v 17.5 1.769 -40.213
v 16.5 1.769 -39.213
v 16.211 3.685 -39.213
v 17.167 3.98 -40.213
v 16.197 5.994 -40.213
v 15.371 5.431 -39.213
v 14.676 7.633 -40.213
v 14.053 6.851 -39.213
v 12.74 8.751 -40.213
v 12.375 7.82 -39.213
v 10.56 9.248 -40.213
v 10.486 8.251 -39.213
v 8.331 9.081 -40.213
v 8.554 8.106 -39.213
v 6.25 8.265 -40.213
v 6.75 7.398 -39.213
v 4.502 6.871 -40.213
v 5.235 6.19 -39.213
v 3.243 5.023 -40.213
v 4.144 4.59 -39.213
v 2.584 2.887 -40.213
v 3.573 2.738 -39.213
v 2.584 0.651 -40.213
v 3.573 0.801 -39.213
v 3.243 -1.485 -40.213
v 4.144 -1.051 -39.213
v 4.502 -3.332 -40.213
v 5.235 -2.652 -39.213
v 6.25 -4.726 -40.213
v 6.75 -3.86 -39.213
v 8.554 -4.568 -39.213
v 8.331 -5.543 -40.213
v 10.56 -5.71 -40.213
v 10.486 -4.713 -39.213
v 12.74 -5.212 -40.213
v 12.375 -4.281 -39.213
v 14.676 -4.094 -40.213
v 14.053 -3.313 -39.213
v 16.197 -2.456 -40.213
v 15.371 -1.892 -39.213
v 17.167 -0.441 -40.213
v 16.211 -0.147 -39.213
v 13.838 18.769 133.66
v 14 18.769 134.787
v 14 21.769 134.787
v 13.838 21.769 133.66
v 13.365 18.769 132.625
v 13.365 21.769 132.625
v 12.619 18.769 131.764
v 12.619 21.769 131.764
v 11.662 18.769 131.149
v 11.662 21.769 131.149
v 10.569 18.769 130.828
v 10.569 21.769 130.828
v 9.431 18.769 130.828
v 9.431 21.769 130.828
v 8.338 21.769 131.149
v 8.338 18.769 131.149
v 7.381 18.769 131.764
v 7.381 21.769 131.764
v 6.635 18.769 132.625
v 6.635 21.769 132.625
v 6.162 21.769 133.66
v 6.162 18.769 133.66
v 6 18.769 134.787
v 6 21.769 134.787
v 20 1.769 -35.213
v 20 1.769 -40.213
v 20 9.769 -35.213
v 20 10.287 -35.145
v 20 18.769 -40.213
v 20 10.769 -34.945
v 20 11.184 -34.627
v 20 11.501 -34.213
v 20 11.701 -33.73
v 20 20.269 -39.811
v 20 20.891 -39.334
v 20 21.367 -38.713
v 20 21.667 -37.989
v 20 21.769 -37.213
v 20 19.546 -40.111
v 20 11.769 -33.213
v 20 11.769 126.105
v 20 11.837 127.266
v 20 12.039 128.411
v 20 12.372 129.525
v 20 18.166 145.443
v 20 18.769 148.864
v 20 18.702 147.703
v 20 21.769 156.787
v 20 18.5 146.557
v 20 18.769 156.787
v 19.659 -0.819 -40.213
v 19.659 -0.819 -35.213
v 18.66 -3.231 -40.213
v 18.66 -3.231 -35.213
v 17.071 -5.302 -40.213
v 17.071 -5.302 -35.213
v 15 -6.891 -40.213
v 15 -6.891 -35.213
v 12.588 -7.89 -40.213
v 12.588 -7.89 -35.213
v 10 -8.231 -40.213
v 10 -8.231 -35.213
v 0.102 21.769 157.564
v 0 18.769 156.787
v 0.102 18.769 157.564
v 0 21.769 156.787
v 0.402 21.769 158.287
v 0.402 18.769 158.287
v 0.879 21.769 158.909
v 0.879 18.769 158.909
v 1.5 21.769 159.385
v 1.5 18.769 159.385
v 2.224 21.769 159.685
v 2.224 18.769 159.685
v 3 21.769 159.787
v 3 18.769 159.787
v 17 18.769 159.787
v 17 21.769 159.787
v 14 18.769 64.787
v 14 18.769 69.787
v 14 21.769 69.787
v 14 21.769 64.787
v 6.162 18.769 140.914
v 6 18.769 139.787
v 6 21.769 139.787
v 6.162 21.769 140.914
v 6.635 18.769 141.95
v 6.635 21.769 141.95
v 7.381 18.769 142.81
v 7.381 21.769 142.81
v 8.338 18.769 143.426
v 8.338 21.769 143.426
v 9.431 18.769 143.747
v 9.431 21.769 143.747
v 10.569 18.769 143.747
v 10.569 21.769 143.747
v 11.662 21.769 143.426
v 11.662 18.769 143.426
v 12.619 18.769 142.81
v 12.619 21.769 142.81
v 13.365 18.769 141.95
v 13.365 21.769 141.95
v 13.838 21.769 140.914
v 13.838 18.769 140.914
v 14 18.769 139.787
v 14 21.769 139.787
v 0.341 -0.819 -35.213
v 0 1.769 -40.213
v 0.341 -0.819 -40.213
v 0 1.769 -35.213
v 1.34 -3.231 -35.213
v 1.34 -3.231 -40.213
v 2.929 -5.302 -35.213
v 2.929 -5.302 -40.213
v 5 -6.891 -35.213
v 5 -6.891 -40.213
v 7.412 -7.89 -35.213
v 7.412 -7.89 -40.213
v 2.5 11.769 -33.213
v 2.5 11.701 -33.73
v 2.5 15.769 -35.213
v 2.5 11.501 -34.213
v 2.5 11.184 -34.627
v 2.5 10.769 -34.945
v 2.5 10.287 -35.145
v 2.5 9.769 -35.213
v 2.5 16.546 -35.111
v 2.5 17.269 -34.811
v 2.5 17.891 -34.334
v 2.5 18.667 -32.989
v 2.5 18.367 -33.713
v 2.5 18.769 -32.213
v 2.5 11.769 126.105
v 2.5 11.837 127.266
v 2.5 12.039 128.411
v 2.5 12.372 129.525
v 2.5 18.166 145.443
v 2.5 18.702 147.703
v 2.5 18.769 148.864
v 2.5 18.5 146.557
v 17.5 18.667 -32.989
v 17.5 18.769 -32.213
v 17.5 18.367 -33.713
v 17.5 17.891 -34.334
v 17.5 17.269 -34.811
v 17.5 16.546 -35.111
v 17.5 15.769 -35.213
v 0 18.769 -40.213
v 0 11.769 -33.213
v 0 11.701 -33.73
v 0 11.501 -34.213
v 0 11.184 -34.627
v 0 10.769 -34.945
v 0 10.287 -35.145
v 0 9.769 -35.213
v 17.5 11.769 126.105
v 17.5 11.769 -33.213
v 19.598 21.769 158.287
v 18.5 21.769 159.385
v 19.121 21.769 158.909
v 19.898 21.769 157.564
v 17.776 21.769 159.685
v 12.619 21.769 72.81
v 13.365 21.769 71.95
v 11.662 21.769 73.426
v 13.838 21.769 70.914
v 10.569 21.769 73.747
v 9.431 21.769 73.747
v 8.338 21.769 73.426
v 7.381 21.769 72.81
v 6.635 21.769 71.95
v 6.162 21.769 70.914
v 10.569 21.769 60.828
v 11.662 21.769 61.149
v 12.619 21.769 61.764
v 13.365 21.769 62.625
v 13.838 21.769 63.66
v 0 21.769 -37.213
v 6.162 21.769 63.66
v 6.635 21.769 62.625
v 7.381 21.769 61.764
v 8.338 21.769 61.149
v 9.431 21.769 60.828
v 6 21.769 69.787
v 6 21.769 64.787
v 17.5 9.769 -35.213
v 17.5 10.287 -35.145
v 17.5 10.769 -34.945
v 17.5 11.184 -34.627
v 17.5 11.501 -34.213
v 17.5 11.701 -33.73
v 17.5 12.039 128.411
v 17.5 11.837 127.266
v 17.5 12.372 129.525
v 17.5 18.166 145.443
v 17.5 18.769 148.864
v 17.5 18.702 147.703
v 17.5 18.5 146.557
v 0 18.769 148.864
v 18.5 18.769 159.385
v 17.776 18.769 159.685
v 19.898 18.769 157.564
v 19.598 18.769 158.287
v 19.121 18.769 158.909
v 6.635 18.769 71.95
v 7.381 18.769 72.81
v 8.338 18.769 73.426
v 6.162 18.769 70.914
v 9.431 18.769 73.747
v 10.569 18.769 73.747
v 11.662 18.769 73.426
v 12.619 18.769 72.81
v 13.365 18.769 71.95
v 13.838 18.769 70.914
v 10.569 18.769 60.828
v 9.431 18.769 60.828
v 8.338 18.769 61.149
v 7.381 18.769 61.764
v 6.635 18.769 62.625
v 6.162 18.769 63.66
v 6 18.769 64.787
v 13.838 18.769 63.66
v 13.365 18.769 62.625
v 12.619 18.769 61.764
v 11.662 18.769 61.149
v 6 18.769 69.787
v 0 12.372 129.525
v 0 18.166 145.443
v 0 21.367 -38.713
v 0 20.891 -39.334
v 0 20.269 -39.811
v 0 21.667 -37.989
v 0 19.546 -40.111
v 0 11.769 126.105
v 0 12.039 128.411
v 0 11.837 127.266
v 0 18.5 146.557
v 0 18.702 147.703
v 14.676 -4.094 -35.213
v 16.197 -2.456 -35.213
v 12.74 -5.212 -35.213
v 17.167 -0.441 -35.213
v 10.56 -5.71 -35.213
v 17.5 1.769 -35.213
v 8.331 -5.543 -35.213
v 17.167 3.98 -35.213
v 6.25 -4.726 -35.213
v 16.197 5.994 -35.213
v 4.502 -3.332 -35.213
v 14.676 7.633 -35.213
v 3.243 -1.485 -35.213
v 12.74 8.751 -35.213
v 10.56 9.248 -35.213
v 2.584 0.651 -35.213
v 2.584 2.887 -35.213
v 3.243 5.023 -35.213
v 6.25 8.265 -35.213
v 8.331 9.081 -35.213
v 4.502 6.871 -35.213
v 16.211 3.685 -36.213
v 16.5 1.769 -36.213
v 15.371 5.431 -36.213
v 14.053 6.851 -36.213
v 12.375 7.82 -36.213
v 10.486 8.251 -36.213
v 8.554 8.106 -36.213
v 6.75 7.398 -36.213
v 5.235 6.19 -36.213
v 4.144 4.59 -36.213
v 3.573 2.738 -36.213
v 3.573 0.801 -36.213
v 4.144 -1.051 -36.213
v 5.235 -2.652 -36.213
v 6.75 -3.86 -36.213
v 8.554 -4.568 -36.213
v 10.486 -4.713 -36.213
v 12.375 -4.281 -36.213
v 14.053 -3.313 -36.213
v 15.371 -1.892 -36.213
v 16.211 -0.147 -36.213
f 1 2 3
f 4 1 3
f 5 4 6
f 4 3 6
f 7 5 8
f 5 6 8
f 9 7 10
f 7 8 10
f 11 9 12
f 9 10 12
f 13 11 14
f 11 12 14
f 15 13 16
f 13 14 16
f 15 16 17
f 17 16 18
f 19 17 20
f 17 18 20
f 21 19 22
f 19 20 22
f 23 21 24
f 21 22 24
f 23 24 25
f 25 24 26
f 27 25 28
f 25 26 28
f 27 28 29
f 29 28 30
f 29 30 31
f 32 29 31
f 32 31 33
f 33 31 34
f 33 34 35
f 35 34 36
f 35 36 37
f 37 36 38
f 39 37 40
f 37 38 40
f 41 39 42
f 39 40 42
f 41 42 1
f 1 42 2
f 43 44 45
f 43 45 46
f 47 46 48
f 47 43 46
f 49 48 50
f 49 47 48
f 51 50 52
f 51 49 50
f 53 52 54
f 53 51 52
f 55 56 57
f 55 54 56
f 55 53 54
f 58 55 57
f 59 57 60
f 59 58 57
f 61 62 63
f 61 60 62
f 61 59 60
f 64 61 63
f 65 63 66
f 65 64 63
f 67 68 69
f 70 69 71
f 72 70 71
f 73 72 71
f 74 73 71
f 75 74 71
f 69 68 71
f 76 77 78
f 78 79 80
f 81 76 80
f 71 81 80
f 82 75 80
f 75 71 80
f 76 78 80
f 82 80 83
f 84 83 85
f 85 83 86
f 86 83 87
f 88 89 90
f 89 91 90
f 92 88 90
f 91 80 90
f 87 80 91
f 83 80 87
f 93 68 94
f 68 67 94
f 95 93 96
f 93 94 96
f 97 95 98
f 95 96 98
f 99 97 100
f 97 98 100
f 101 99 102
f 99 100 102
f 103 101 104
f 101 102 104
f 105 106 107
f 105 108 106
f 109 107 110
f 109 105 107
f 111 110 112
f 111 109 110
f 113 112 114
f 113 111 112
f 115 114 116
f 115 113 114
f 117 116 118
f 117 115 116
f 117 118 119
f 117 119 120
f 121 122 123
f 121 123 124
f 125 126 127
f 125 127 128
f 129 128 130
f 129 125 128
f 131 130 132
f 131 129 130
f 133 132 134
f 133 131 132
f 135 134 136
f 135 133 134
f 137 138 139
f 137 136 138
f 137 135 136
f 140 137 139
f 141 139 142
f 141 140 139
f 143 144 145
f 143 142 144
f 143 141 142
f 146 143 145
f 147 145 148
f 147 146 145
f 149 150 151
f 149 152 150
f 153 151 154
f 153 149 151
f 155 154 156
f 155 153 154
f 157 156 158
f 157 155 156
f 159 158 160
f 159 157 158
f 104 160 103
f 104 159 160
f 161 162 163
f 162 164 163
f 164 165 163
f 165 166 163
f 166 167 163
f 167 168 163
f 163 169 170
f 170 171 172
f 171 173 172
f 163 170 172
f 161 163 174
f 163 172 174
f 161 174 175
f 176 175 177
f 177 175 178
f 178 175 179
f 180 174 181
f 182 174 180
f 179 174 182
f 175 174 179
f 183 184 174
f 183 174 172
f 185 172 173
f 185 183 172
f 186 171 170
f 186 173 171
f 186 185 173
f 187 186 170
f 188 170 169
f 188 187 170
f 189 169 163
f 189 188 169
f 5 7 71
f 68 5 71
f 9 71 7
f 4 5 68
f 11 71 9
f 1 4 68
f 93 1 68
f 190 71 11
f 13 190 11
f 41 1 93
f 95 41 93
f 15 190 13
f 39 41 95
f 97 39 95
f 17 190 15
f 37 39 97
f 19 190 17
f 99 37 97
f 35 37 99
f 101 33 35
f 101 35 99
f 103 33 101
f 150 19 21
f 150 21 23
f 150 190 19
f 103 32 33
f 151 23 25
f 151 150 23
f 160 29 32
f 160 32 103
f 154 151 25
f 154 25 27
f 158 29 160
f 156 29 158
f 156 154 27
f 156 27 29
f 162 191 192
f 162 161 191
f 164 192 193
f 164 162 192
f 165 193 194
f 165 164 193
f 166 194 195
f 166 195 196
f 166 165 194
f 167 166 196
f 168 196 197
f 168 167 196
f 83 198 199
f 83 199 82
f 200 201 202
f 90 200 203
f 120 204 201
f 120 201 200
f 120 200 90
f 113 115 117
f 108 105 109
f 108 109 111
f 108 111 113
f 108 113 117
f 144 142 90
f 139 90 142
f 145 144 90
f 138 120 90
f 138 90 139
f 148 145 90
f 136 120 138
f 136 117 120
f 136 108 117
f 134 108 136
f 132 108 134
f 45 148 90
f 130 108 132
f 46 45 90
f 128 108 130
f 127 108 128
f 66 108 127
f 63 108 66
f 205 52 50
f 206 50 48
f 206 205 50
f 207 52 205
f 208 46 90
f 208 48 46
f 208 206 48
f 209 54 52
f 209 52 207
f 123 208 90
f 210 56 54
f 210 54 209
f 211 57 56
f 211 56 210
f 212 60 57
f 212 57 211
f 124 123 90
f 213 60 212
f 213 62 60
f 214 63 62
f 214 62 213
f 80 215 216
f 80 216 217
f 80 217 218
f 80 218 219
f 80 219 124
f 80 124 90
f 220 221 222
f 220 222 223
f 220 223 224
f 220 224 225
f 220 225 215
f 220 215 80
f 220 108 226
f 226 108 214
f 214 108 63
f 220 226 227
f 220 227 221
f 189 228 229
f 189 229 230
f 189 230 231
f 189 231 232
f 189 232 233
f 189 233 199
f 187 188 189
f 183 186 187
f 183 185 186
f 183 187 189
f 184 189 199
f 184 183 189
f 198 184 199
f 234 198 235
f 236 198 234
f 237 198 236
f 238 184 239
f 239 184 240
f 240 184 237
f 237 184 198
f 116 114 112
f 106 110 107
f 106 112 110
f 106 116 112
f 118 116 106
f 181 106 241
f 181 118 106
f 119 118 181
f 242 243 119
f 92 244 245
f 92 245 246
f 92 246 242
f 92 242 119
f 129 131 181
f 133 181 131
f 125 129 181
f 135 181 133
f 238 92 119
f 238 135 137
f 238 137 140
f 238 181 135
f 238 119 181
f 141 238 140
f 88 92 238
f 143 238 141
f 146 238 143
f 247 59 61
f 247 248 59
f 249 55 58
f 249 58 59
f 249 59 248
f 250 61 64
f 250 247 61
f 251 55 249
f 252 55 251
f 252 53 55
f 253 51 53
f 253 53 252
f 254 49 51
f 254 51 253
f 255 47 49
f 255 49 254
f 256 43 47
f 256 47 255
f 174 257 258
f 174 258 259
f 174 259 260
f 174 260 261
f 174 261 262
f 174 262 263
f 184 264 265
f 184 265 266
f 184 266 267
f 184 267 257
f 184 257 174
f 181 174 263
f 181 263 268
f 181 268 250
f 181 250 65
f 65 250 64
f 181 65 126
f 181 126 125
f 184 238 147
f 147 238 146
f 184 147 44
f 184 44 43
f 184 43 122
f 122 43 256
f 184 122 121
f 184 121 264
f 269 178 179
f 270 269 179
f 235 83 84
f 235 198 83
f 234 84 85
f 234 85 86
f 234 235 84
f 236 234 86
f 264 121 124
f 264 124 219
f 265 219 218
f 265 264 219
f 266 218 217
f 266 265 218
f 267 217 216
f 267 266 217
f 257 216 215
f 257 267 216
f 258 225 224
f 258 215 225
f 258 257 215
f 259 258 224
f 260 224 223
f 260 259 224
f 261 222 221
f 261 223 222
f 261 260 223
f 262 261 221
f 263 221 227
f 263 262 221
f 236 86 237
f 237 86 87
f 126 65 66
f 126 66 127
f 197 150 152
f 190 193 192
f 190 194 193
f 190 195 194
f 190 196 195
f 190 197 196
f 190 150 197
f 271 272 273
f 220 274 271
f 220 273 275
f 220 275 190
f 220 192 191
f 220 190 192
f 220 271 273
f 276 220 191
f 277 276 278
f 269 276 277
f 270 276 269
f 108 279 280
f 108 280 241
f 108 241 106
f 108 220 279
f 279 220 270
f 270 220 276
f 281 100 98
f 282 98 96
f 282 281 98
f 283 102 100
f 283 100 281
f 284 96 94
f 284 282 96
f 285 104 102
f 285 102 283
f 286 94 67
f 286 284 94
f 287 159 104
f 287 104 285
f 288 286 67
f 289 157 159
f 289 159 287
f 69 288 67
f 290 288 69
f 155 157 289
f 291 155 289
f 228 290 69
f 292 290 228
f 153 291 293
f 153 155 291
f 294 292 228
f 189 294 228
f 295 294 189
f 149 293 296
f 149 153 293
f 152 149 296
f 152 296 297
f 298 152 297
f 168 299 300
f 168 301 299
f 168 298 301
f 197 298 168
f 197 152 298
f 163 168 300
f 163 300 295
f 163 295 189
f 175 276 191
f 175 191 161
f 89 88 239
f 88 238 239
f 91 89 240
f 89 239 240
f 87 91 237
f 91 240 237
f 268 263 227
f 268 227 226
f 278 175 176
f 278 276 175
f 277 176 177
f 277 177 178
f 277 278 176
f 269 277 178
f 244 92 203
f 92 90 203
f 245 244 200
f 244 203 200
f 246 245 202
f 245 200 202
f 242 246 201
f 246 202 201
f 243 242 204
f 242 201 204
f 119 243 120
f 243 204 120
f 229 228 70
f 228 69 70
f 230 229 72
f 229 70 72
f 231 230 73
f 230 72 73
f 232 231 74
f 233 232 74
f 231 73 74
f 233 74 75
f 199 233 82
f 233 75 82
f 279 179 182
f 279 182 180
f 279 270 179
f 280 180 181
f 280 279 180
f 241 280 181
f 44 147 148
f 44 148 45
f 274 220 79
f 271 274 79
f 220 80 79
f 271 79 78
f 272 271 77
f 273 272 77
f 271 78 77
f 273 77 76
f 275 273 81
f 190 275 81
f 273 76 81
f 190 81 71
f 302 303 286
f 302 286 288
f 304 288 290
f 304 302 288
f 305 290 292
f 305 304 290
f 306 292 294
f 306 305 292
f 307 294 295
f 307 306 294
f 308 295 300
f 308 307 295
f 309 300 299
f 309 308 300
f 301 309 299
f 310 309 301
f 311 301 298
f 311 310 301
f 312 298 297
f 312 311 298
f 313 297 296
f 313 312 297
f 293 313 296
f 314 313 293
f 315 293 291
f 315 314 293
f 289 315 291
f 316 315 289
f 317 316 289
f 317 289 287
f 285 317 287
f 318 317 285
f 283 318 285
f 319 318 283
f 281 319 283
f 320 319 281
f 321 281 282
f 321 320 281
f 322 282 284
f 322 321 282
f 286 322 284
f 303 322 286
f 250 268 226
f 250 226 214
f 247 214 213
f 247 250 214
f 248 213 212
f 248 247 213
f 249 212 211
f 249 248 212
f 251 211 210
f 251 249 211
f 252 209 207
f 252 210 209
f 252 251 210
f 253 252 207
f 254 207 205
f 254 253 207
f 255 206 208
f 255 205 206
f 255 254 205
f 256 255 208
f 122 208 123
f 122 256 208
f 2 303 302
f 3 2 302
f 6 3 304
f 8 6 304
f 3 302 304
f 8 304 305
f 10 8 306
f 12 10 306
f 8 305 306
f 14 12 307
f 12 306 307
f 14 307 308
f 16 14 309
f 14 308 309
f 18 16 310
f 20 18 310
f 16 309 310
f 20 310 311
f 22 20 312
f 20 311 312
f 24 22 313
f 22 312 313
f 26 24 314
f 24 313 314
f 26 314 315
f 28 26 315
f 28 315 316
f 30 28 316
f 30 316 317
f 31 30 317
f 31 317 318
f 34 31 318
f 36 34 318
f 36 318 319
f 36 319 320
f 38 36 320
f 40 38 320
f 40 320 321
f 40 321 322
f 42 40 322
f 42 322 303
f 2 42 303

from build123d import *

# Parameters (mm, degrees)
BOSS_EXTRUDE1_DEPTH = 20
CUT_EXTRUDE1_DEPTH  = 20
LPATTERN1_COUNT     = 2
LPATTERN1_PITCH     = 70
SKETCH3_R           = 6.5
CUT_EXTRUDE2_DEPTH  = 20
FILLET1_R           = 3
FILLET2_R           = 10
CHAMFER1_SIZE       = 1
FILLET3_R           = 3
SKETCH4_W           = 2.5
SKETCH4_H           = 193.282741961
BOSS_EXTRUDE2_DEPTH = 7
LPATTERN2_COUNT     = 2
LPATTERN2_PITCH     = 17.5
CHAMFER2_SIZE       = 27.474774195
CHAMFER2_SIZE_2     = 10
FILLET4_R           = 10
FILLET5_R           = 2


# Some blends are built 0.0001 mm under size
with BuildPart() as part:
    # Sketch1 → Boss-Extrude1 (new body)
    with BuildSketch(Plane(origin=(0, 0, 0), x_dir=(0, 0, -1), z_dir=(1, 0, 0))):
        Polygon((-159.787234043, 21.769316909), (40.212765957, 21.769316909), (40.212765957, -8.230683091), (35.212765957, -8.230683091), (35.212765957, 18.769316909), (-159.787234043, 18.769316909), align=None)
    extrude(amount=BOSS_EXTRUDE1_DEPTH)

    # Sketch2 → Cut-Extrude1 (cut)
    with BuildSketch(Plane.XZ.offset(-18.769316909)):
        with BuildLine():
            Line((14, 139.787234043), (14, 134.787234043))
            ThreePointArc((14, 134.787234043), (10, 130.787234043), (6, 134.787234043))
            Line((6, 134.787234043), (6, 139.787234043))
            ThreePointArc((6, 139.787234043), (10, 143.787234043), (14, 139.787234043))
        make_face()
    cut_extrude1 = extrude(amount=-CUT_EXTRUDE1_DEPTH, mode=Mode.SUBTRACT)

    # LPattern1: Cut-Extrude1 ×2
    with Locations(*[(0, 0, -i * LPATTERN1_PITCH) for i in range(1, LPATTERN1_COUNT)]):
        add(cut_extrude1, mode=Mode.SUBTRACT)

    # Sketch3 → Cut-Extrude2 (cut)
    with BuildSketch(Plane.XY.offset(-35.212765957)):
        with Locations((10, 1.769316909)):
            Circle(SKETCH3_R)
    extrude(amount=-CUT_EXTRUDE2_DEPTH, mode=Mode.SUBTRACT)

    # Fillet1
    fillet1_edges = [part.edges().sort_by_distance(p)[0] for p in [
        (10, 21.769316909, -40.212765957),
        (10, 18.769316909, -35.212765957),
    ]]
    fillet(fillet1_edges, radius=FILLET1_R)

    # Fillet2
    fillet2_edges = [part.edges().sort_by_distance(p)[0] for p in [
        (0, -8.230683091, -37.712765957),
        (20, -8.230683091, -37.712765957),
    ]]
    fillet(fillet2_edges, radius=FILLET2_R - 0.0001)  # a hair under: the kernel refuses the full size

    # Chamfer1
    chamfer1_edges = [part.edges().sort_by_distance(p)[0] for p in [
        (3.5, 1.769316909, -40.212765957),
        (3.5, 1.769316909, -35.212765957),
    ]]
    chamfer(chamfer1_edges, length=CHAMFER1_SIZE)

    # Fillet3
    fillet3_edges = [part.edges().sort_by_distance(p)[0] for p in [
        (20, 20.269316909, 159.787234043),
        (0, 20.269316909, 159.787234043),
    ]]
    fillet(fillet3_edges, radius=FILLET3_R)

    # Sketch4 → Boss-Extrude2 (add)
    with BuildSketch(Plane.XZ.offset(-18.769316909)):
        with Locations((1.25, 58.701442972)):
            Rectangle(SKETCH4_W, SKETCH4_H)
    boss_extrude2 = extrude(amount=BOSS_EXTRUDE2_DEPTH)

    # LPattern2: Boss-Extrude2 ×2
    with Locations(*[(i * LPATTERN2_PITCH, 0, 0) for i in range(1, LPATTERN2_COUNT)]):
        add(boss_extrude2)

    # Chamfer2
    # the kernel refuses this chamfer: 27.474774195, 10 mm, written as the material it takes off along each edge
    with BuildSketch(Plane(origin=(73.774914494, 11.769316909, 155.342813952), x_dir=(0, -0.013184058198645638, -0.9999130865277315), z_dir=(-1, 0, 0))) as chamfer2_piece_1_section:
        Polygon((CHAMFER2_SIZE * 0.999913086511, -CHAMFER2_SIZE * 0.0131840581984), (-CHAMFER2_SIZE_2 * 0.0131840581986, -CHAMFER2_SIZE_2 * 0.999913086528), (0, 0), align=None)
    chamfer2_piece_1 = extrude(amount=145.049828987, mode=Mode.PRIVATE)
    chamfer2_piece_1 = split(chamfer2_piece_1, bisect_by=Plane(origin=(1.25, 18.769316909, 145.126312786), z_dir=(0, -1, 0)), keep=Keep.TOP, mode=Mode.PRIVATE)
    add(chamfer2_piece_1, mode=Mode.SUBTRACT)
    with BuildSketch(Plane(origin=(91.274914494, 11.769316909, 155.342813952), x_dir=(0, -0.013184058198645638, -0.9999130865277315), z_dir=(-1, 0, 0))) as chamfer2_piece_2_section:
        Polygon((CHAMFER2_SIZE * 0.999913086511, -CHAMFER2_SIZE * 0.0131840581984), (-CHAMFER2_SIZE_2 * 0.0131840581986, -CHAMFER2_SIZE_2 * 0.999913086528), (0, 0), align=None)
    chamfer2_piece_2 = extrude(amount=145.049828987, mode=Mode.PRIVATE)
    chamfer2_piece_2 = split(chamfer2_piece_2, bisect_by=Plane(origin=(18.75, 18.769316909, 145.126312786), z_dir=(0, -1, 0)), keep=Keep.TOP, mode=Mode.PRIVATE)
    add(chamfer2_piece_2, mode=Mode.SUBTRACT)

    # Fillet4
    fillet4_edges = [part.edges().sort_by_distance(p)[0] for p in [
        (1.25, 11.769316909, 127.868039758),
        (18.75, 11.769316909, 127.868039758),
        (1.25, 18.769316909, 147.100381694),
        (18.75, 18.769316909, 147.100381694),
    ]]
    fillet(fillet4_edges, radius=FILLET4_R)

    # Fillet5
    fillet5_edges = [part.edges().sort_by_distance(p)[0] for p in [
        (1.25, 11.769316909, -35.212765957),
        (18.75, 11.769316909, -35.212765957),
    ]]
    fillet(fillet5_edges, radius=FILLET5_R)


solid = part.part
